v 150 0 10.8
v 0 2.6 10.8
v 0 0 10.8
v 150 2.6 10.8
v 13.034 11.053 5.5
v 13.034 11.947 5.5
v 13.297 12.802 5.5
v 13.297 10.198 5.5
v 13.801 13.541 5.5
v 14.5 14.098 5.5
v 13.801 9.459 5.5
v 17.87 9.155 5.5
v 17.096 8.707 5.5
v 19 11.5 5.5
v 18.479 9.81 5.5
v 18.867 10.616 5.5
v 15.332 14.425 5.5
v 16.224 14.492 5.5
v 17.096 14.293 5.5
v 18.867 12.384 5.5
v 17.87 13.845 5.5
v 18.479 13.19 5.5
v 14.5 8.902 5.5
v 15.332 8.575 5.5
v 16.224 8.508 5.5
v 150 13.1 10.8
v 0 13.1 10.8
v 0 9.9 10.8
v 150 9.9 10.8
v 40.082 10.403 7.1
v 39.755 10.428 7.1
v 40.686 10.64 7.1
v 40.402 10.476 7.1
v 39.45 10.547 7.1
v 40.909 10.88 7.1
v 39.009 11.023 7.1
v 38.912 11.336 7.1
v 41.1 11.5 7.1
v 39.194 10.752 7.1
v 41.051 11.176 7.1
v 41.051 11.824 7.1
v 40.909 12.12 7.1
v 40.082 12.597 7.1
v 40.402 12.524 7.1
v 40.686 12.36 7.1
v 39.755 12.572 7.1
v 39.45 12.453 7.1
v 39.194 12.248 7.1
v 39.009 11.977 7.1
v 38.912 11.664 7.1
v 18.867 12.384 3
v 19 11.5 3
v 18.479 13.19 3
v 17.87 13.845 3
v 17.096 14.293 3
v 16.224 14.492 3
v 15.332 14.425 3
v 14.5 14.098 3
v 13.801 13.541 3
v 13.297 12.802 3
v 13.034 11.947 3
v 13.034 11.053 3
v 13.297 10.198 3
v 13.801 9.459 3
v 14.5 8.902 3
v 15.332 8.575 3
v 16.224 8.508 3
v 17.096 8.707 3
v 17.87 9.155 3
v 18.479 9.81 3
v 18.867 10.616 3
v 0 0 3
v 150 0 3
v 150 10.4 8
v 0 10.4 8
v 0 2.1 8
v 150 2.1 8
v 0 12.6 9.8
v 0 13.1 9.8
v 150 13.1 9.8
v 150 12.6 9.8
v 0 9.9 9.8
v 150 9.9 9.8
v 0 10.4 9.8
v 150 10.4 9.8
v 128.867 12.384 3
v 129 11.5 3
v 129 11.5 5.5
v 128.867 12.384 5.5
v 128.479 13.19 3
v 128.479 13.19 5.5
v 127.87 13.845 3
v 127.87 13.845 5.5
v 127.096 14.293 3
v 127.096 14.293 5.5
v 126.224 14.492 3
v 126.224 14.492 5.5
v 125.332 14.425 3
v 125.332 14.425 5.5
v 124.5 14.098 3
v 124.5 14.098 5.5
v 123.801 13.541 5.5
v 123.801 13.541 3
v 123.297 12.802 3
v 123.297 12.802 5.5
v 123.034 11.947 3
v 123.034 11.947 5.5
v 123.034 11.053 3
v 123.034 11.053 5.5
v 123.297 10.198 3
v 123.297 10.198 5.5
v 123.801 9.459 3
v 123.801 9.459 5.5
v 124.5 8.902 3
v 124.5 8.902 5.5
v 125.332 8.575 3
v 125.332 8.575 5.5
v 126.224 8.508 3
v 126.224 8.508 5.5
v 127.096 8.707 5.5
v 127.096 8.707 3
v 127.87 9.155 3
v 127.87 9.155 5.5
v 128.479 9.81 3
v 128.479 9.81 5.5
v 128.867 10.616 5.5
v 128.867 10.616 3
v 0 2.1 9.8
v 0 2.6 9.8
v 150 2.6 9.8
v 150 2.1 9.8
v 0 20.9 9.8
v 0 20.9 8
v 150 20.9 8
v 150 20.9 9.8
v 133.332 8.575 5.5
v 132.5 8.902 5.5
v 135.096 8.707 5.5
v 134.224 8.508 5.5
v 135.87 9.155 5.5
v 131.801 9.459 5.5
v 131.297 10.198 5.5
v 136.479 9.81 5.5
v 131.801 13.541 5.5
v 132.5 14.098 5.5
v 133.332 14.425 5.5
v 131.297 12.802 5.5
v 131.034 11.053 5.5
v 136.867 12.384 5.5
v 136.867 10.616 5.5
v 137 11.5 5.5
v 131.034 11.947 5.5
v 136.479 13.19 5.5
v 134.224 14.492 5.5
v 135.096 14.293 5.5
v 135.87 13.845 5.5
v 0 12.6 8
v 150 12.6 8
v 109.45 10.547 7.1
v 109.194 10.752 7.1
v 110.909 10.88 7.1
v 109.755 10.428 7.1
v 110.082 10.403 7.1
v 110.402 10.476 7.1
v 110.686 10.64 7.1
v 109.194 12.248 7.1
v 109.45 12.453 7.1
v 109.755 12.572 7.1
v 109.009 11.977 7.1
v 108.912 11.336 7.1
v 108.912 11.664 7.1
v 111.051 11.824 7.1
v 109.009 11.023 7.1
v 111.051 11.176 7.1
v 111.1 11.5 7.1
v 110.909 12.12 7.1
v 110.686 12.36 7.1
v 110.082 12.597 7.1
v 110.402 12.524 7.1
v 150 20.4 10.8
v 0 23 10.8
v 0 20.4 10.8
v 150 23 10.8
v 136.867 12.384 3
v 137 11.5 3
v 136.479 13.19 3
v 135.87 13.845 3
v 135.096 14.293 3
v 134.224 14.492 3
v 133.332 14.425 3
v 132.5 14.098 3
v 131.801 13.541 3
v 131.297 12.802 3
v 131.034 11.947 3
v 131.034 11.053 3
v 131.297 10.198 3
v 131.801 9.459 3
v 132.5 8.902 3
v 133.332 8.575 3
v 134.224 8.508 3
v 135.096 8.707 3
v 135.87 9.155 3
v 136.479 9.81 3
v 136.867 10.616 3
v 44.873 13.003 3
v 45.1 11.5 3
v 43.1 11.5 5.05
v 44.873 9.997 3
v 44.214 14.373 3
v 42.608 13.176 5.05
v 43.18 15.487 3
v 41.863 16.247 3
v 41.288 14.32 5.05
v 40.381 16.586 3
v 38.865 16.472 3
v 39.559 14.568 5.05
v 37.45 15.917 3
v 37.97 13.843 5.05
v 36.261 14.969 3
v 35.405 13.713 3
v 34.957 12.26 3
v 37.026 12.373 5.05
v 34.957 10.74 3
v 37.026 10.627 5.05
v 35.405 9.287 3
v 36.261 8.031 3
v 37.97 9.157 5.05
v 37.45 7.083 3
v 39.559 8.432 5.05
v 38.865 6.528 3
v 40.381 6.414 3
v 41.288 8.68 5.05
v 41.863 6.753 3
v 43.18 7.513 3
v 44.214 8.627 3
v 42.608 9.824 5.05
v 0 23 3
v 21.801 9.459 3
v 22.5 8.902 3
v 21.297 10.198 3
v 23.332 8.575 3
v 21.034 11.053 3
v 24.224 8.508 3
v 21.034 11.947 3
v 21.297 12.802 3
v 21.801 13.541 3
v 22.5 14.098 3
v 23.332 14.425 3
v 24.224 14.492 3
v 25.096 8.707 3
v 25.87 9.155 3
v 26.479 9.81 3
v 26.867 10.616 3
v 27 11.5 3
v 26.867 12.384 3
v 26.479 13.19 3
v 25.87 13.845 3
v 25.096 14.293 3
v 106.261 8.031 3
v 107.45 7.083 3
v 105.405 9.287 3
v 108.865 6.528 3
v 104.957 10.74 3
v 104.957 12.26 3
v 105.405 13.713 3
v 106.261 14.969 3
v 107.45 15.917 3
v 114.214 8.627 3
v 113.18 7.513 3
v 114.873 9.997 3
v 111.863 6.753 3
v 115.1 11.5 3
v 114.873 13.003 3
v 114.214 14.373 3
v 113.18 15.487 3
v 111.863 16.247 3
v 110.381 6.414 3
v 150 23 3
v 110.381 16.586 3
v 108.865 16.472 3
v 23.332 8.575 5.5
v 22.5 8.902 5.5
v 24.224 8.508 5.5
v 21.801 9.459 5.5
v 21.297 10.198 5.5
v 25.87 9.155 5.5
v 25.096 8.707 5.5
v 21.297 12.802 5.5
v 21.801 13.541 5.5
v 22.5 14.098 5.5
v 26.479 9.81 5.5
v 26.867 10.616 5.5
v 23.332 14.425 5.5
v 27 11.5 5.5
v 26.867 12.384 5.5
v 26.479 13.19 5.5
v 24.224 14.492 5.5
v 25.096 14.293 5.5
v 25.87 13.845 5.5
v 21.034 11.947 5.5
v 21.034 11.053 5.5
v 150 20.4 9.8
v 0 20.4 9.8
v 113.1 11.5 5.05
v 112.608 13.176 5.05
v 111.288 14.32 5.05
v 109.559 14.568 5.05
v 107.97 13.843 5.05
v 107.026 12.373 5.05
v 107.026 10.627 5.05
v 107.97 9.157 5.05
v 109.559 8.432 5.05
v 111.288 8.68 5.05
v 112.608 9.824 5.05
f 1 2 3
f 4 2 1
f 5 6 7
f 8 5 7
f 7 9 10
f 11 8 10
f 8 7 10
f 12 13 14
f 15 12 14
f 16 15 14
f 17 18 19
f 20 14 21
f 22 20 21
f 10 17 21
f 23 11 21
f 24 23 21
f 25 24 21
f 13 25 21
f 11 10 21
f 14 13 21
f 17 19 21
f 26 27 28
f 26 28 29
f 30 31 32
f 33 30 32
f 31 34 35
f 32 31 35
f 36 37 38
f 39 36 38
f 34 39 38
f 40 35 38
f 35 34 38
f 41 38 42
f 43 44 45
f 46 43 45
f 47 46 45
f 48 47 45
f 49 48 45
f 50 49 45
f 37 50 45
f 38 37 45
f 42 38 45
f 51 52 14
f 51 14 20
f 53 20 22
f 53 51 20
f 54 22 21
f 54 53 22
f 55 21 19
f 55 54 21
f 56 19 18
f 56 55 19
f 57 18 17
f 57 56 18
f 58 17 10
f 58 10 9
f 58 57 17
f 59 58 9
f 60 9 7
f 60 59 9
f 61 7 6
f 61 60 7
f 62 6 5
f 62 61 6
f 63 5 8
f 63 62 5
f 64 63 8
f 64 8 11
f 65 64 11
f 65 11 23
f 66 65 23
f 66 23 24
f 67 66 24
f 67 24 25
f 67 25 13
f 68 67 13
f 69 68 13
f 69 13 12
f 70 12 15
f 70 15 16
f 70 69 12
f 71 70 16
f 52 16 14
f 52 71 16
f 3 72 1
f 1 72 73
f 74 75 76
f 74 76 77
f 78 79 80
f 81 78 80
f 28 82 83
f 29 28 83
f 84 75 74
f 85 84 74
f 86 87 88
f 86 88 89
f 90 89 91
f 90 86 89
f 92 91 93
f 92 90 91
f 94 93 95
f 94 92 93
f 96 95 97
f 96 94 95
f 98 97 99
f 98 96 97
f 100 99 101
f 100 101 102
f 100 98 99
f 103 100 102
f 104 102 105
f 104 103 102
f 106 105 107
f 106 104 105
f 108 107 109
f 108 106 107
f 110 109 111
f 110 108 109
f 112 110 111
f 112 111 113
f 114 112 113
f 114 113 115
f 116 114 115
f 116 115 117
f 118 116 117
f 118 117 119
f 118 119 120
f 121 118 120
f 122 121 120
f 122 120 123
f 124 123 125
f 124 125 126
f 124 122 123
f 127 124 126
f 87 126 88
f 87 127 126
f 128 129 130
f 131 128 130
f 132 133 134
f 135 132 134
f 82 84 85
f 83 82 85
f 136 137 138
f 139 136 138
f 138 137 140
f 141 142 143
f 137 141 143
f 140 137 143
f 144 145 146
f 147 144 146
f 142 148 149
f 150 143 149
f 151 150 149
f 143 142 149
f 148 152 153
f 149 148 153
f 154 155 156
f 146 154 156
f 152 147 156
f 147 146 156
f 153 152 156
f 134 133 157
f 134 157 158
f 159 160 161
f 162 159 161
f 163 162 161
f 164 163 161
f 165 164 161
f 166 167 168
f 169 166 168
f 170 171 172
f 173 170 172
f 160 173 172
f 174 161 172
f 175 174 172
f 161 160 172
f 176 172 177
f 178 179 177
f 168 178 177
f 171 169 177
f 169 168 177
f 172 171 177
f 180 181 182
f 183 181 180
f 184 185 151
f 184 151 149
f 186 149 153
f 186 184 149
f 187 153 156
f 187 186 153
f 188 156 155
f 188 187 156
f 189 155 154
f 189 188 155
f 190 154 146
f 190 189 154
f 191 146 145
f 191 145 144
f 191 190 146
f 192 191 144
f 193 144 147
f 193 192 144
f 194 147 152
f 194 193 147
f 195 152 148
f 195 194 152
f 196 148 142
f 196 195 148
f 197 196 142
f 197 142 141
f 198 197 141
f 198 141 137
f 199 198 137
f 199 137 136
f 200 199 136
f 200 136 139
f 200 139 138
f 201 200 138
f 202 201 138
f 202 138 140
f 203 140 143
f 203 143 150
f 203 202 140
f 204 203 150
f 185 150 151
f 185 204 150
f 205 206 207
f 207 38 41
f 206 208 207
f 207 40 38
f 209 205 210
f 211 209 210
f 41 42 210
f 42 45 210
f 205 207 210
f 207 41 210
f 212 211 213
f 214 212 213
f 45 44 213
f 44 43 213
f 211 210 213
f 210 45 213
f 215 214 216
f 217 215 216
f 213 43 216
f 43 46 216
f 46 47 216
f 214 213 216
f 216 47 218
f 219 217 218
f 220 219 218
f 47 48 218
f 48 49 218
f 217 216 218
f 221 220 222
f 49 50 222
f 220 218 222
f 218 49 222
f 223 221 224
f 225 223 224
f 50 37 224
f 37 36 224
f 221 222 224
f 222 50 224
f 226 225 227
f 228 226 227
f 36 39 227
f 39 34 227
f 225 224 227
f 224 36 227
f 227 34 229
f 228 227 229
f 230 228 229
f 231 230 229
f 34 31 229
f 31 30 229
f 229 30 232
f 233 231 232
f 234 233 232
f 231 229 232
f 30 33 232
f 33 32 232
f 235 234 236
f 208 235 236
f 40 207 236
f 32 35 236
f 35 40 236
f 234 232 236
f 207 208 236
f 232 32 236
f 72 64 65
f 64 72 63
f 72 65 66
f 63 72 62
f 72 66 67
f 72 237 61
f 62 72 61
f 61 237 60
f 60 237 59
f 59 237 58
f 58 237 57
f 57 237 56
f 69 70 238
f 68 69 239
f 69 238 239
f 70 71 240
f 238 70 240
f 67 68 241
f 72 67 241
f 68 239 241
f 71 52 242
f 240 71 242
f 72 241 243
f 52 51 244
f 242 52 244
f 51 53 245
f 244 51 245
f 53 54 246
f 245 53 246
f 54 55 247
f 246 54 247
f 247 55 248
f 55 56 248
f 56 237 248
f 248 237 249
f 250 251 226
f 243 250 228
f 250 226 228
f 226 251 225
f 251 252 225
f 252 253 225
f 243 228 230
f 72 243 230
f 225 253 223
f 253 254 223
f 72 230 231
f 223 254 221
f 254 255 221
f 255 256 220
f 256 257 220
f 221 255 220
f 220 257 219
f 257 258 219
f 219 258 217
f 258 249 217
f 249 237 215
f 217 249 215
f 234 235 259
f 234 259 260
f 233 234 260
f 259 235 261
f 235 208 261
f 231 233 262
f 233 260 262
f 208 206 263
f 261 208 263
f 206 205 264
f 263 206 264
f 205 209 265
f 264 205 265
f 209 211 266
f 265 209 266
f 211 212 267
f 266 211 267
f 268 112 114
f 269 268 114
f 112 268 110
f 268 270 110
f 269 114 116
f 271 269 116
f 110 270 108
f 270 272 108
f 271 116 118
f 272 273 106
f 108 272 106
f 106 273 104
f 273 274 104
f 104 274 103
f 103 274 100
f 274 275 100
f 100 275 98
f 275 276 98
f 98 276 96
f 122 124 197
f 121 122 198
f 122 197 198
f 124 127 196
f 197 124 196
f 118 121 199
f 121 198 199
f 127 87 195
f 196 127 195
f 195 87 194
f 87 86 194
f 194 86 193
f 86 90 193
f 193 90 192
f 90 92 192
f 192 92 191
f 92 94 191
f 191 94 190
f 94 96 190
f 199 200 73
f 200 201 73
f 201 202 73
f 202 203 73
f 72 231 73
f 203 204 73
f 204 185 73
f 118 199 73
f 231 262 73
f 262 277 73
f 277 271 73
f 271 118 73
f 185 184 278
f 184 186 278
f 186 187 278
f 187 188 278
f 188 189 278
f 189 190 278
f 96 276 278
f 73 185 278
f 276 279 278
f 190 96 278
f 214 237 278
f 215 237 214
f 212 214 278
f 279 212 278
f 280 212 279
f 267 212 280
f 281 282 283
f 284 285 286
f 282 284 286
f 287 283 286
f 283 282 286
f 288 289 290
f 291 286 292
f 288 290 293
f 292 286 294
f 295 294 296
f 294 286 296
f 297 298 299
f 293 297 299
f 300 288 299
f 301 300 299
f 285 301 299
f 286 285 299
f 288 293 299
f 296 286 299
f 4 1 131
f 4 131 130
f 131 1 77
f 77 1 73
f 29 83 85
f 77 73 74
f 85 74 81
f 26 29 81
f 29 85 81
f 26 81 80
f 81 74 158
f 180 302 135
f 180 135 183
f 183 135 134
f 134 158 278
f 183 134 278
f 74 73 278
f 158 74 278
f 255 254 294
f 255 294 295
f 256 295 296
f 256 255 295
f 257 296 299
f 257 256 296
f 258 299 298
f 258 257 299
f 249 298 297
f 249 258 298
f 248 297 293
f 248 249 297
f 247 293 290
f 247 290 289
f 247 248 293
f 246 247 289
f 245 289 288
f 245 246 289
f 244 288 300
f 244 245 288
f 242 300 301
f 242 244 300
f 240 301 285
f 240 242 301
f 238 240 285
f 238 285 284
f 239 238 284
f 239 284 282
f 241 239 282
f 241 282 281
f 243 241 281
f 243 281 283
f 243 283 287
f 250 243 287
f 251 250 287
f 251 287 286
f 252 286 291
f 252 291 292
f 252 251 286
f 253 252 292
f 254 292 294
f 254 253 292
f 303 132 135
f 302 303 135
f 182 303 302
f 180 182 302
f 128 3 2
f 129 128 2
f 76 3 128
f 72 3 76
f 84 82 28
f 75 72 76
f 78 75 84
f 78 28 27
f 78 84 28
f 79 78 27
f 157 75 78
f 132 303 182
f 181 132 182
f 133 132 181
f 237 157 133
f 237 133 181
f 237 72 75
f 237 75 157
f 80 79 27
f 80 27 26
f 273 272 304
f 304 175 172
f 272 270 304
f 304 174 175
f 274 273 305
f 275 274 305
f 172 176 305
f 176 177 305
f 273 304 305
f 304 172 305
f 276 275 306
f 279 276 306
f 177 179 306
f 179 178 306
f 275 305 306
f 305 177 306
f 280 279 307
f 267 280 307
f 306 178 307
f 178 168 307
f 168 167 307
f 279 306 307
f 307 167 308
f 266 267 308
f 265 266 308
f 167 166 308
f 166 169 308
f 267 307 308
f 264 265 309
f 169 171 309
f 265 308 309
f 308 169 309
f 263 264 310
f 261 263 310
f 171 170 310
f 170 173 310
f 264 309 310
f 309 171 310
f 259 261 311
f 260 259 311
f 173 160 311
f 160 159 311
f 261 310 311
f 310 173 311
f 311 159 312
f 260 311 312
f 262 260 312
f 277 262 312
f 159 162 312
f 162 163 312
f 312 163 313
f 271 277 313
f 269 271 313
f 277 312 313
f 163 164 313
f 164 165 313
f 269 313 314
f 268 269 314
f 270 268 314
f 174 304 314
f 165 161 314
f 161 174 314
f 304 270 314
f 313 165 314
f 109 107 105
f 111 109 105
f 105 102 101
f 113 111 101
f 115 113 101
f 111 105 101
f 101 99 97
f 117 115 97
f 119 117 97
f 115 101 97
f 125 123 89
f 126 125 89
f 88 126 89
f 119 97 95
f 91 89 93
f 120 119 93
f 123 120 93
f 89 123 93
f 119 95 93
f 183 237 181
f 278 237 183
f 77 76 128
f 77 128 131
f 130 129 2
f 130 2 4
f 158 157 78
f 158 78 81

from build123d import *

# Parameters (mm, degrees)
BOX017_W          = 150
BOX017_H          = 7.3
BOX017_DEPTH      = 1
BOX018_W          = 150
BOX018_H          = 7.3
BOX018_DEPTH      = 1
BOX016_W          = 150
BOX016_H          = 8.3
BOX016_DEPTH      = 1.8
BOX015_W          = 150
BOX015_H          = 8.3
BOX015_DEPTH      = 1.8
BOX014_W          = 150
BOX014_H          = 23
BOX014_DEPTH      = 2.8
CYLINDER006_R     = 3
CYLINDER006_DEPTH = 2.5
CYLINDER005_R     = 3
CYLINDER005_DEPTH = 2.5
CYLINDER007_R     = 3
CYLINDER007_DEPTH = 2.5
CYLINDER004_R     = 3
CYLINDER004_DEPTH = 2.5
BOX001_W          = 150
BOX001_H          = 23
BOX001_DEPTH      = 5


with BuildPart() as box017:
    # Box017 → Box017 (new body)
    with BuildSketch(Plane(origin=(0, 2.6, 10.8), x_dir=(1, 0, 0), z_dir=(0, 0, 1))):
        with Locations((75, 3.65)):
            Rectangle(BOX017_W, BOX017_H)
    extrude(amount=BOX017_DEPTH)


with BuildPart() as box018:
    # Box018 → Box018 (new body)
    with BuildSketch(Plane(origin=(0, 13.1, 10.8), x_dir=(1, 0, 0), z_dir=(0, 0, 1))):
        with Locations((75, 3.65)):
            Rectangle(BOX018_W, BOX018_H)
    extrude(amount=BOX018_DEPTH)


with BuildPart() as box016:
    # Box016 → Box016 (new body)
    with BuildSketch(Plane(origin=(0, 12.6, 9), x_dir=(1, 0, 0), z_dir=(0, 0, 1))):
        with Locations((75, 4.15)):
            Rectangle(BOX016_W, BOX016_H)
    extrude(amount=BOX016_DEPTH)


with BuildPart() as fusion006:
    # Box015 → Box015 (new body)
    with BuildSketch(Plane(origin=(0, 2.1, 9), x_dir=(1, 0, 0), z_dir=(0, 0, 1))):
        with Locations((75, 4.15)):
            Rectangle(BOX015_W, BOX015_H)
    extrude(amount=BOX015_DEPTH)

    # Fusion006: union Box017, Box018, Box016
    add(box017.part)
    add(box018.part)
    add(box016.part)


with BuildPart() as f_2x_8mm_tape:
    # Box014 → Box014 (new body)
    with BuildSketch(Plane.XY.offset(9)):
        with Locations((75, 11.5)):
            Rectangle(BOX014_W, BOX014_H)
    extrude(amount=BOX014_DEPTH)

    # Cut006: cut Fusion006
    add(fusion006.part, mode=Mode.SUBTRACT)


with BuildPart() as f_2x_8mm_tape_1:
    # Cut006 placement: moved
    add(f_2x_8mm_tape.part.moved(Location((0, 0, -1))))


with BuildPart() as cone002:
    # Cone002 → Cone002 (revolve)
    with BuildSketch(Plane(origin=(40, 11.5, 3), x_dir=(1, 0, 0), z_dir=(0, -1, 0))):
        Polygon((0, 0), (5.1, 0), (1.1, 4.1), (0, 4.1), align=None)
    revolve(axis=Axis((40, 11.5, 3), (0, 0, 1)))


with BuildPart() as cone003:
    # Cone003 → Cone003 (revolve)
    with BuildSketch(Plane(origin=(110, 11.5, 3), x_dir=(1, 0, 0), z_dir=(0, -1, 0))):
        Polygon((0, 0), (5.1, 0), (1.1, 4.1), (0, 4.1), align=None)
    revolve(axis=Axis((110, 11.5, 3), (0, 0, 1)))


with BuildPart() as cylinder006:
    # Cylinder006 → Cylinder006 (new body)
    with BuildSketch(Plane(origin=(24, 11.5, 3), x_dir=(1, 0, 0), z_dir=(0, 0, 1))):
        Circle(CYLINDER006_R)
    extrude(amount=CYLINDER006_DEPTH)


with BuildPart() as cylinder005:
    # Cylinder005 → Cylinder005 (new body)
    with BuildSketch(Plane(origin=(126, 11.5, 3), x_dir=(1, 0, 0), z_dir=(0, 0, 1))):
        Circle(CYLINDER005_R)
    extrude(amount=CYLINDER005_DEPTH)


with BuildPart() as cylinder007:
    # Cylinder007 → Cylinder007 (new body)
    with BuildSketch(Plane(origin=(134, 11.5, 3), x_dir=(1, 0, 0), z_dir=(0, 0, 1))):
        Circle(CYLINDER007_R)
    extrude(amount=CYLINDER007_DEPTH)


with BuildPart() as removals:
    # Cylinder004 → Cylinder004 (new body)
    with BuildSketch(Plane(origin=(16, 11.5, 3), x_dir=(1, 0, 0), z_dir=(0, 0, 1))):
        Circle(CYLINDER004_R)
    extrude(amount=CYLINDER004_DEPTH)

    # Fusion002: union Cone002, Cone003, Cylinder006, Cylinder005, Cylinder007
    add(cone002.part)
    add(cone003.part)
    add(cylinder006.part)
    add(cylinder005.part)
    add(cylinder007.part)


with BuildPart() as top_2x_8mm:
    # Box001 → Box001 (new body)
    with BuildSketch(Plane.XY.offset(3)):
        with Locations((75, 11.5)):
            Rectangle(BOX001_W, BOX001_H)
    extrude(amount=BOX001_DEPTH)

    # Cut001: cut removals
    add(removals.part, mode=Mode.SUBTRACT)

    # Fusion009: union 2X_8mm_tape
    add(f_2x_8mm_tape_1.part)


solid = top_2x_8mm.part
